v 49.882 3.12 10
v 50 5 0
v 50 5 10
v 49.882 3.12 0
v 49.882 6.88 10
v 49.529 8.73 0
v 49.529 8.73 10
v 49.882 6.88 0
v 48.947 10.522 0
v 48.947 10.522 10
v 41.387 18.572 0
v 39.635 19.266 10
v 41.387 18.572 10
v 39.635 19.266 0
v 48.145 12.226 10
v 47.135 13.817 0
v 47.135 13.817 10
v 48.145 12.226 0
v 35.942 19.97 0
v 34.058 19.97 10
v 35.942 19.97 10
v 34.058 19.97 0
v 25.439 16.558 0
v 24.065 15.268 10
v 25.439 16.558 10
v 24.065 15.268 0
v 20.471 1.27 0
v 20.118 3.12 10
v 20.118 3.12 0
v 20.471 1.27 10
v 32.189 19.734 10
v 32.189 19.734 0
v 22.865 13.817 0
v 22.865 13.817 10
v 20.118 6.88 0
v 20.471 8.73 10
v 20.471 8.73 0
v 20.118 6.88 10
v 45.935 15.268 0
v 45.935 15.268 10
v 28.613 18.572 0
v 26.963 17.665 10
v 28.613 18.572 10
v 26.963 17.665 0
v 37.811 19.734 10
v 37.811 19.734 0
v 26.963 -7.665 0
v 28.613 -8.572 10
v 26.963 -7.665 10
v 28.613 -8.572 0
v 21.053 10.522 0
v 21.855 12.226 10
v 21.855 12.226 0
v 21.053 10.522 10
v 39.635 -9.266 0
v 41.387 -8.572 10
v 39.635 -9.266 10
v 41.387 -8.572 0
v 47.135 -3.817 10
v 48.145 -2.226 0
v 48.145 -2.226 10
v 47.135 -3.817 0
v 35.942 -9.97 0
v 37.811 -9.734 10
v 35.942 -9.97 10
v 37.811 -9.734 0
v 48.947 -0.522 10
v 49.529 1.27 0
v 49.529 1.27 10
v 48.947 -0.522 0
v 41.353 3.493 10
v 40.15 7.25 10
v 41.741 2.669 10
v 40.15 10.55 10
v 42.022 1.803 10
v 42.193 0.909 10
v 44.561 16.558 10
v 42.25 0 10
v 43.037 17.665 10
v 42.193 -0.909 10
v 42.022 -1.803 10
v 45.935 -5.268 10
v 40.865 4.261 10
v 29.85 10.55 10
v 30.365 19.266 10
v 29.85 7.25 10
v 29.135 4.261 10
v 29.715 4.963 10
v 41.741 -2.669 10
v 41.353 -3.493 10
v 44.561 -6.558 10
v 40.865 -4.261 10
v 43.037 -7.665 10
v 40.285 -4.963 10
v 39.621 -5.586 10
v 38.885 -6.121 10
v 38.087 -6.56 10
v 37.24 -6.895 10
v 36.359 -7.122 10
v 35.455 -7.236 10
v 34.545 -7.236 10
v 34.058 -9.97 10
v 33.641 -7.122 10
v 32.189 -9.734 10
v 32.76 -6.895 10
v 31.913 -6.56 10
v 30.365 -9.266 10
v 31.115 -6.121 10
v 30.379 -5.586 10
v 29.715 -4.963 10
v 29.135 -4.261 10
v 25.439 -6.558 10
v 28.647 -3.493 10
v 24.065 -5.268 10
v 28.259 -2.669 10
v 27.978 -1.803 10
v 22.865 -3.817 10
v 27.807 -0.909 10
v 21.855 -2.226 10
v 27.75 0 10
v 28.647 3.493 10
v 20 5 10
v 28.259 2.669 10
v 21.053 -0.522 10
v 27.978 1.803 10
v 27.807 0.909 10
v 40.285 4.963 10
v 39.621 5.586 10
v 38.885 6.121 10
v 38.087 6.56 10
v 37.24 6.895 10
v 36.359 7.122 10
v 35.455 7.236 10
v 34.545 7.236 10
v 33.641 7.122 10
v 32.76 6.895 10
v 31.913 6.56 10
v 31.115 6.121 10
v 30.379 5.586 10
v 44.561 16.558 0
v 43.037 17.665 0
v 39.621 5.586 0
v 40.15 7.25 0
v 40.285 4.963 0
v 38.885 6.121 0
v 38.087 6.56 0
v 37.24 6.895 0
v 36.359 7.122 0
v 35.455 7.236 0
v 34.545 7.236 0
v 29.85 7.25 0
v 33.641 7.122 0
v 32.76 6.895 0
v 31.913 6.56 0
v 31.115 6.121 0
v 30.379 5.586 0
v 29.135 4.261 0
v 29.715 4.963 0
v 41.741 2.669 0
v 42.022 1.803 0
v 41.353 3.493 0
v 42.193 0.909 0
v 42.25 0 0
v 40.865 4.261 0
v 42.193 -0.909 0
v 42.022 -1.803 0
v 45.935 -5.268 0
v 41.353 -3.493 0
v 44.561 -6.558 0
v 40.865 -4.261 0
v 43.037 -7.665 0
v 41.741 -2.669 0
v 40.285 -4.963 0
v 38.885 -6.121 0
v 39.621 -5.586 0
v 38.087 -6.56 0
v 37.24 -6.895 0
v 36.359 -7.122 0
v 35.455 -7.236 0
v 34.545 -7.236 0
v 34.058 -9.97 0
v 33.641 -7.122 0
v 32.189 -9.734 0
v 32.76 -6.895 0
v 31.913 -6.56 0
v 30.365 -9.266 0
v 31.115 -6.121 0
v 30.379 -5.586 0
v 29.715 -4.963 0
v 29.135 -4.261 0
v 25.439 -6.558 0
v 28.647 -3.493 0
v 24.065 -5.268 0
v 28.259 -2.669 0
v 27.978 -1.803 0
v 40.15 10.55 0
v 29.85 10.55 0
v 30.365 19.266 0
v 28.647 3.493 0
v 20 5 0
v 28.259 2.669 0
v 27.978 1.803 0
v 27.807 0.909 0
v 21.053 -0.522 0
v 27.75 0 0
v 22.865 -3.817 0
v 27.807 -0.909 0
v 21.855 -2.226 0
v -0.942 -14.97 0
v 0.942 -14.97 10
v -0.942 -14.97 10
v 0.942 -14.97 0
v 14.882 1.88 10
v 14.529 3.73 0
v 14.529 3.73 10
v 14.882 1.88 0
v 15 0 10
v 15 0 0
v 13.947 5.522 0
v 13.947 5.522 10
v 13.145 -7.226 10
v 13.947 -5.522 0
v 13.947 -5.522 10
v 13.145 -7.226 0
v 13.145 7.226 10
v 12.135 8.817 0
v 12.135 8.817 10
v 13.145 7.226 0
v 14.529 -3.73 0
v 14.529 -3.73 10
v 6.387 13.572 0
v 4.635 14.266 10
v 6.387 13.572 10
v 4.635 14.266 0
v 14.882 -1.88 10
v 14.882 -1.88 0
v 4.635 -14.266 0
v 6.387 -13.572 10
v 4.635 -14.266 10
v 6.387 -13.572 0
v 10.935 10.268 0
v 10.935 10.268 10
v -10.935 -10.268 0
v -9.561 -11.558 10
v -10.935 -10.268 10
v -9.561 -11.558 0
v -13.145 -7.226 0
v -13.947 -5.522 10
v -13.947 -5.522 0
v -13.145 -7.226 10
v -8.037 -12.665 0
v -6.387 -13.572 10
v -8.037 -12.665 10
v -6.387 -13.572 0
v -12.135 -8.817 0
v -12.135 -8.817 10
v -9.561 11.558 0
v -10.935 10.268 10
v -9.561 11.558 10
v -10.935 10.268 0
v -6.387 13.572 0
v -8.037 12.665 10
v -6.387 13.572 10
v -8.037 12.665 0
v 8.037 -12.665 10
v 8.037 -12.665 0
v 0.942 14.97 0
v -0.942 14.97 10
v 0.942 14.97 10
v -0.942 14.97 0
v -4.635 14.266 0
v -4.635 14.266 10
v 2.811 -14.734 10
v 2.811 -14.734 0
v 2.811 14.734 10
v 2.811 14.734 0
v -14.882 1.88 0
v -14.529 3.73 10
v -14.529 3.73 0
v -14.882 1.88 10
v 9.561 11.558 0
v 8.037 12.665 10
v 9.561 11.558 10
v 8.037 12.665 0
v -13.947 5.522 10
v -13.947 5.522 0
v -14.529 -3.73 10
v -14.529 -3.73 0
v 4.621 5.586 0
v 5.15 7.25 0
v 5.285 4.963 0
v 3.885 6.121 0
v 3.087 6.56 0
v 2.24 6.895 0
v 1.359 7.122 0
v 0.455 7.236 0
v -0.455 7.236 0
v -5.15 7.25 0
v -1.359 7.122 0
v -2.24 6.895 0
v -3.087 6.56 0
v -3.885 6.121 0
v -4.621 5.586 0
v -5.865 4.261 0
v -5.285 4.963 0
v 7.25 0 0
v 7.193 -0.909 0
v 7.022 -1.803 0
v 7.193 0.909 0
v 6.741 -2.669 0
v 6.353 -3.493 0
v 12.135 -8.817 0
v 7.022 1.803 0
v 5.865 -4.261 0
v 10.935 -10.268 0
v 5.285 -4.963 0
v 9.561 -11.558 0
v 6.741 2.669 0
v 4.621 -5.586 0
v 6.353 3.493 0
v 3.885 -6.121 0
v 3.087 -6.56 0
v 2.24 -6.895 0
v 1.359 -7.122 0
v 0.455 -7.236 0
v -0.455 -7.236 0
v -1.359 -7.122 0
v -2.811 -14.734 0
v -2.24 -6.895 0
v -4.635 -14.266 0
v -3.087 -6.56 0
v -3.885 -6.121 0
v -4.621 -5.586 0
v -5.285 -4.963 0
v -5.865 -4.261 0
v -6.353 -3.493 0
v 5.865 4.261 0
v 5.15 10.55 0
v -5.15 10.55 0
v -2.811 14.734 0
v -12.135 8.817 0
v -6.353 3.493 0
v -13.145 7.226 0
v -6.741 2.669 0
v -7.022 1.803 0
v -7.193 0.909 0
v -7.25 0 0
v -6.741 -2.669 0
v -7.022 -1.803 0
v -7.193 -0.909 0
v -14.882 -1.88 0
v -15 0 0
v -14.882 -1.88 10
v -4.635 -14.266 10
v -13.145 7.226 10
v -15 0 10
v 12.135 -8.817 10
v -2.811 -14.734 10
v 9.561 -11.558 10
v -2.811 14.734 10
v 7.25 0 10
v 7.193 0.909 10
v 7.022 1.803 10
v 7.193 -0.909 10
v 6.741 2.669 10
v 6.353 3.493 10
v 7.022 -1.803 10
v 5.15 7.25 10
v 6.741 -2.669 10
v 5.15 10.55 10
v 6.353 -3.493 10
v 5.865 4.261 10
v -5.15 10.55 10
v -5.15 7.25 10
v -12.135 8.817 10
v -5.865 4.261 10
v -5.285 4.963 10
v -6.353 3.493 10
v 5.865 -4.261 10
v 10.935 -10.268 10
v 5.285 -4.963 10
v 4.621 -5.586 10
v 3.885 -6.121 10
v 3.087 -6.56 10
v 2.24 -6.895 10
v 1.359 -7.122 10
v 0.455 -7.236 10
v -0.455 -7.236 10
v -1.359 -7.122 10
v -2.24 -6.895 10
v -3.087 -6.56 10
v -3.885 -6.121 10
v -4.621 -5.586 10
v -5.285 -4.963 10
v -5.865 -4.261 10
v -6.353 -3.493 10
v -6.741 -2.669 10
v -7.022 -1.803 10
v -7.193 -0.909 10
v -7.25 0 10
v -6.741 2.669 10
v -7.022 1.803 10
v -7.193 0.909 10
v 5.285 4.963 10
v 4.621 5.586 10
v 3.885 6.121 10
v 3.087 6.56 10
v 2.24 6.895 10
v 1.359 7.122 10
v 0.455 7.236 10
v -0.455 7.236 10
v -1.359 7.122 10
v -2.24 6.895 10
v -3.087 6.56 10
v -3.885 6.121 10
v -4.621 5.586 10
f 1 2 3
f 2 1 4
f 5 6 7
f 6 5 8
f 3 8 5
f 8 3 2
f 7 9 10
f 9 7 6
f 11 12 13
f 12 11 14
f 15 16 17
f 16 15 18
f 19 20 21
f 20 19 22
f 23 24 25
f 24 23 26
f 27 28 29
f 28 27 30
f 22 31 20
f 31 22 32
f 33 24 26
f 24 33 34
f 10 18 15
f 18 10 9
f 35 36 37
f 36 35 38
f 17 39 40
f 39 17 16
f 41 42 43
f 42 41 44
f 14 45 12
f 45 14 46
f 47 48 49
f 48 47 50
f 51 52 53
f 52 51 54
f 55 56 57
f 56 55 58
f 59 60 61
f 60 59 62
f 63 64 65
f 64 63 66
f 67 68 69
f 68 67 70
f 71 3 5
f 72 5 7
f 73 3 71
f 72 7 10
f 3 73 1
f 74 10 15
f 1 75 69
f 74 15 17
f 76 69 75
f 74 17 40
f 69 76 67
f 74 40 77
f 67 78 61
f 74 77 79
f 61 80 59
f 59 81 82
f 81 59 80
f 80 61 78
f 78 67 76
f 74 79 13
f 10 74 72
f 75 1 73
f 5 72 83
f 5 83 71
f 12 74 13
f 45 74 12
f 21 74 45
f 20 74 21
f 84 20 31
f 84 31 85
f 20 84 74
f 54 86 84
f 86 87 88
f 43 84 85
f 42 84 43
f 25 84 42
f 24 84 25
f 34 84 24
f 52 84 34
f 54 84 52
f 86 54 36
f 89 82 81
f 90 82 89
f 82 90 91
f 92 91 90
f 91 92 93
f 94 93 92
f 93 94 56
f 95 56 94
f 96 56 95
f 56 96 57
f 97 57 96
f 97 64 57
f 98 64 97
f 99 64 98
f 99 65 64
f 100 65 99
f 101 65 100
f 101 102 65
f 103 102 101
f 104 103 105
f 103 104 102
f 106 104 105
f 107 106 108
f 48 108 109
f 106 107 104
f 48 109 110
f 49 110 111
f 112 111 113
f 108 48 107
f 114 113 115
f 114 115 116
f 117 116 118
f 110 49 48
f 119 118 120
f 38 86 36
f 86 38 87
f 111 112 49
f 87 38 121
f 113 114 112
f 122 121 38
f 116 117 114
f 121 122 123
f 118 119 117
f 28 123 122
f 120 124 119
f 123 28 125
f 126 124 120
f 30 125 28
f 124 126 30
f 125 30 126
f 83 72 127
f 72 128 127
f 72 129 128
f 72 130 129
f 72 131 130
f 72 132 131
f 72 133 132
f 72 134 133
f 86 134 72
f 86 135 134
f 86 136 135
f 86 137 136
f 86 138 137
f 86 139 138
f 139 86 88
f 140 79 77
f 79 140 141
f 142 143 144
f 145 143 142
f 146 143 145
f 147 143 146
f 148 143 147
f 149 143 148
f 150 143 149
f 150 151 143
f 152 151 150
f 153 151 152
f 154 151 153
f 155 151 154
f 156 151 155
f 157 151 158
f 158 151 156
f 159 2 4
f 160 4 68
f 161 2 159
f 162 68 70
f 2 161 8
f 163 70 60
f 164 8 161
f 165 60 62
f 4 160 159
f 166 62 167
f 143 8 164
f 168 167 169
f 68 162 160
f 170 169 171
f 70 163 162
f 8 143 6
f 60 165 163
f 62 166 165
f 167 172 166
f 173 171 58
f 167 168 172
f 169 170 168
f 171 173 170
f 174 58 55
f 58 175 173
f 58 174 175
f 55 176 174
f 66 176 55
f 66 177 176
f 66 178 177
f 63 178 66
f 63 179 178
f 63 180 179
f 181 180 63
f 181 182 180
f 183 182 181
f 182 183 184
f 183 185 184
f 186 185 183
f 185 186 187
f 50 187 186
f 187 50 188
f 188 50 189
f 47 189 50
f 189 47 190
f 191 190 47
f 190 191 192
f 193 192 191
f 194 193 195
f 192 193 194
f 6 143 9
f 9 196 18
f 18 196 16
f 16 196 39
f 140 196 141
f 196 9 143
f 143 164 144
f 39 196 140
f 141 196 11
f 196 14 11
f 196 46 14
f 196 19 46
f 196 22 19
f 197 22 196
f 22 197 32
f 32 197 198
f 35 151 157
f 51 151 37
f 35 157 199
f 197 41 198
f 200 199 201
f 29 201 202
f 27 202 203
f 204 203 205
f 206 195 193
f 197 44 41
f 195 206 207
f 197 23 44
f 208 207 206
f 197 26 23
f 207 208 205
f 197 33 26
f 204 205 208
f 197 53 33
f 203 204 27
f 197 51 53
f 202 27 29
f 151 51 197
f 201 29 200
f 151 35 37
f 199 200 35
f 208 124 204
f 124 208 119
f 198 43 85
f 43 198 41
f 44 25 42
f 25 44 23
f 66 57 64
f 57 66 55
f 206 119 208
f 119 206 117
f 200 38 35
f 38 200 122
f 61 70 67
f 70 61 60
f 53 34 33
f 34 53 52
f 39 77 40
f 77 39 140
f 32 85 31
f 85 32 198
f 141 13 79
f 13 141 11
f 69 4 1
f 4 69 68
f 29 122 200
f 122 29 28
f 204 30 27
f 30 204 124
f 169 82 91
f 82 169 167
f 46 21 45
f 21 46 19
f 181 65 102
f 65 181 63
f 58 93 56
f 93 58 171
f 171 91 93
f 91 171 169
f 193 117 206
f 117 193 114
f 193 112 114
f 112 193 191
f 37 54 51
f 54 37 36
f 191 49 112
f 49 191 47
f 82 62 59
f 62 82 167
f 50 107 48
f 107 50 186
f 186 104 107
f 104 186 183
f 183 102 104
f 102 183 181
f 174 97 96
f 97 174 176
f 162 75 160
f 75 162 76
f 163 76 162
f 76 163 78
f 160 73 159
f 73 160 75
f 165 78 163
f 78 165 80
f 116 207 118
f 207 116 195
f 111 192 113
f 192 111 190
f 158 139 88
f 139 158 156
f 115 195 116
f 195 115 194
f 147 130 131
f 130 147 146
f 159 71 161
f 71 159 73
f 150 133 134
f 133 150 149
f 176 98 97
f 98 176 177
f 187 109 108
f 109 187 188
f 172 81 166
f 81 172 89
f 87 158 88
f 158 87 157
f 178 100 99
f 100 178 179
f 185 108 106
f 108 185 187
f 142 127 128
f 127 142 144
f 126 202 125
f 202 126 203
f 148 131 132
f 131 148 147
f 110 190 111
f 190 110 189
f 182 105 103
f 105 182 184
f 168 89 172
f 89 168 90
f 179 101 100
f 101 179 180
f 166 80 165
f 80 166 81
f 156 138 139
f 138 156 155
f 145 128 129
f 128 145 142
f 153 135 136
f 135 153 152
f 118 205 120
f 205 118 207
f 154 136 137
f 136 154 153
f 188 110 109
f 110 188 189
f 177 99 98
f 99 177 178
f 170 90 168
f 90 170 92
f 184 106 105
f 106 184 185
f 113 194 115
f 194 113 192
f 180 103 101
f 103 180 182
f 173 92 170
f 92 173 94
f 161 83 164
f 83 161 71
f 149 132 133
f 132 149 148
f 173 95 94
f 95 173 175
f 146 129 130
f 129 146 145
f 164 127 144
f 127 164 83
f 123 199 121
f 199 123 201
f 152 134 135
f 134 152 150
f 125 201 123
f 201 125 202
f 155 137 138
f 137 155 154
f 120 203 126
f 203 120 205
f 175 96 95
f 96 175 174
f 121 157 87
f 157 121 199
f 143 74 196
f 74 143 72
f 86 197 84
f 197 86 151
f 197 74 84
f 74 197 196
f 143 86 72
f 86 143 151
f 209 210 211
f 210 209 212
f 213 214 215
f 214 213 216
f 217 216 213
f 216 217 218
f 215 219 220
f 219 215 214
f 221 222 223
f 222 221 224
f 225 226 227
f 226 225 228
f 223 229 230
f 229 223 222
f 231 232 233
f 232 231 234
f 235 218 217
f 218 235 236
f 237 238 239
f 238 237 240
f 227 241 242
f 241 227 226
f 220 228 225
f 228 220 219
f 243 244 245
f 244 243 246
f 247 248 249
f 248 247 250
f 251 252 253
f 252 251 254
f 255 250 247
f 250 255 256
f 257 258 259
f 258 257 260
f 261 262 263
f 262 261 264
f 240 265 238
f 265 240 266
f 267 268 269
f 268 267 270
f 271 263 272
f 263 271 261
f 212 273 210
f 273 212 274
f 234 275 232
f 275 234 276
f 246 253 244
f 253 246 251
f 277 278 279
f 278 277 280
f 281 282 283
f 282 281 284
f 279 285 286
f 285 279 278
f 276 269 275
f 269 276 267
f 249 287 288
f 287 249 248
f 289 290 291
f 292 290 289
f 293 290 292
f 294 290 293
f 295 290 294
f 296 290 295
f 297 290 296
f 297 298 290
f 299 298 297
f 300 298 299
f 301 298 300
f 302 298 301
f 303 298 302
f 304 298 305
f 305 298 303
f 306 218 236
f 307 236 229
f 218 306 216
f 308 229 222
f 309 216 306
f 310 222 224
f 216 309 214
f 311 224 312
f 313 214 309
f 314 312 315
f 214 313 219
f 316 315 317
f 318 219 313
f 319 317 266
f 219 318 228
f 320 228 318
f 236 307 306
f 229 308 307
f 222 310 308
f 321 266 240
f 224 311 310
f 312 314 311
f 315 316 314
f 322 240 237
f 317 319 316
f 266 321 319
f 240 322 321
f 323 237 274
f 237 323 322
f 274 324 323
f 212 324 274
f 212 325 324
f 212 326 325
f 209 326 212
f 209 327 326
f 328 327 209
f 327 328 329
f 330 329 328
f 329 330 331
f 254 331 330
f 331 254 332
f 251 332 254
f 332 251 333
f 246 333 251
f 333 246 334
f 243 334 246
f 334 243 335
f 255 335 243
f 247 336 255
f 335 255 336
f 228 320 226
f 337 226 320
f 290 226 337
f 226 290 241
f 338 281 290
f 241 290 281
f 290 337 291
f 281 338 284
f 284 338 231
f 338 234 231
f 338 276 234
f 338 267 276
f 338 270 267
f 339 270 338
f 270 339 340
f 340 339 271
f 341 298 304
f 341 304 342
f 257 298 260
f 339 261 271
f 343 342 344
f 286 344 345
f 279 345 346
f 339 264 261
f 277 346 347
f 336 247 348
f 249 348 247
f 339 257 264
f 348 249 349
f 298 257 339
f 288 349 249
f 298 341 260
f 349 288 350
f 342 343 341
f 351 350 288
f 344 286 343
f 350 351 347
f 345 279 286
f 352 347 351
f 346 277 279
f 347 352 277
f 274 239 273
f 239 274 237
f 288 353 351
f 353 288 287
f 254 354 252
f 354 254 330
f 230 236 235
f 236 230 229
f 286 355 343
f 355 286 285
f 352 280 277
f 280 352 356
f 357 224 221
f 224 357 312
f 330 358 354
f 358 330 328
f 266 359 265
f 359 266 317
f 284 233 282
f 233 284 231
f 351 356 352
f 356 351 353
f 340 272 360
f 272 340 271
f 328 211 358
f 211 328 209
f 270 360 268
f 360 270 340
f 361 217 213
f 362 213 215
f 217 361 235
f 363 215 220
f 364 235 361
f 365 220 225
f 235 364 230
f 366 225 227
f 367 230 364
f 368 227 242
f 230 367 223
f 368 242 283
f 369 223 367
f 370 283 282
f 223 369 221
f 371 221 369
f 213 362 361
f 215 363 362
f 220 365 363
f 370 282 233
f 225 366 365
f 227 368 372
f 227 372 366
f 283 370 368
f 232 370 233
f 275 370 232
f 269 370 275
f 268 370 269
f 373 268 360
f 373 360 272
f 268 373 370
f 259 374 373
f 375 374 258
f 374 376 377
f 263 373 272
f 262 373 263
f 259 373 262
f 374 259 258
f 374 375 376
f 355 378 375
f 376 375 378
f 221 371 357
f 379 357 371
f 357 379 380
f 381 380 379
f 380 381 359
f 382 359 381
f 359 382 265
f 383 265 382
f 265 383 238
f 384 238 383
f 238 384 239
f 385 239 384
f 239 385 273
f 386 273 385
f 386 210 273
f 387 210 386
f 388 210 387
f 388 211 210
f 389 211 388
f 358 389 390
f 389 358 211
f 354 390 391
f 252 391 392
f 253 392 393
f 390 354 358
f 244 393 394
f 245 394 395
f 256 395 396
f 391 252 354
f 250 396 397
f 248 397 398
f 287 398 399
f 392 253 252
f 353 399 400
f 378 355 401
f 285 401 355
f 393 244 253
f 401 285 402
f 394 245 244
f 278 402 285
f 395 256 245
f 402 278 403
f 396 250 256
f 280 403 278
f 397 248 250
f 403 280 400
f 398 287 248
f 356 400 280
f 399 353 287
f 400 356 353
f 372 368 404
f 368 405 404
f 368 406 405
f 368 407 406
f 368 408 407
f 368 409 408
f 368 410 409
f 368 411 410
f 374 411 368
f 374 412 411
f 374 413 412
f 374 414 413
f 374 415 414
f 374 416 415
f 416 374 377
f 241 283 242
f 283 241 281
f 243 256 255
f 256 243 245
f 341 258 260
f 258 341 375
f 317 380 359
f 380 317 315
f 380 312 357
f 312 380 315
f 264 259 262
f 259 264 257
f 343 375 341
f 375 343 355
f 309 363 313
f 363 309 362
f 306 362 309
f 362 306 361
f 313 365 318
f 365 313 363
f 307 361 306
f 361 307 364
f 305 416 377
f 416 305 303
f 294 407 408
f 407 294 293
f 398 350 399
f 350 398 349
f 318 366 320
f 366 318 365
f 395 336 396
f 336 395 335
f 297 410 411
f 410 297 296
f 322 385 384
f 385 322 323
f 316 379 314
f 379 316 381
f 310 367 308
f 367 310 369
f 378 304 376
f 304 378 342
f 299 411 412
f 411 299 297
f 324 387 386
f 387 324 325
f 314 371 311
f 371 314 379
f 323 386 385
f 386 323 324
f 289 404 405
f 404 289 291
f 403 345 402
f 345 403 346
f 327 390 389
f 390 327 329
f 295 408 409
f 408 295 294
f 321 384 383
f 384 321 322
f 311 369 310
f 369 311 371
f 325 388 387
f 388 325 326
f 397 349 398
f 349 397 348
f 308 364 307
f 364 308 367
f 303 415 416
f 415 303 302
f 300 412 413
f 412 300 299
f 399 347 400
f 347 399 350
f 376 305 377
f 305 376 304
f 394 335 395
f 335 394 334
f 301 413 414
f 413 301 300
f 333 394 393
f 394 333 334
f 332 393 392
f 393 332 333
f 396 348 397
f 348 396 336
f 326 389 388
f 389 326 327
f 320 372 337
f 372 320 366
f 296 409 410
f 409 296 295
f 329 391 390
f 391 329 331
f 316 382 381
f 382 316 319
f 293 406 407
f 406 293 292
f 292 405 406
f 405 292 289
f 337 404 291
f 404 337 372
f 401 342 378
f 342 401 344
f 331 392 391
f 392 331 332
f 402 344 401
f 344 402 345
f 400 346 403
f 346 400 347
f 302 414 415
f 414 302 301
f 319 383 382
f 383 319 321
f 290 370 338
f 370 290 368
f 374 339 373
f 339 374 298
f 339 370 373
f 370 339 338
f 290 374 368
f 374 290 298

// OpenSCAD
$fn = 50;

module centre_roller(roller_diam, shaft_diam, key_x, key_y, axis_off, height) {
    difference() {
        // The actual roller
        translate([0, axis_off, 0]) cylinder(d=roller_diam, h=height);
        // The centre bearing
        translate([0, 0, -0.01]) cylinder(d=shaft_diam, h=height+0.02);
        // The key
        translate([-key_x/2, shaft_diam/2, -0.01]) cube([key_x, key_y, height+0.02]);
    }
}

module end_block(roller_diam, shaft_diam, height) { difference() {
    cube([end_block_length, end_block_width, 10]);
    translate([0, end_block_width/2, -0.01]) union() {
        translate([
            (end_block_length-roller_diam-separation)/2, 0, 0
        ]) cylinder(d=shaft_diam, h=height+0.02);
        translate([
            (end_block_length+roller_diam+separation)/2, 0, 0
        ]) cylinder(d=shaft_diam, h=height+0.02);
    }
}}

roller_diam = 30;
shaft_diam = 14.5;
key_x = 10.3;
key_y = 3.3;
axis_off = 5;
height = 10;

// bearing diameter = corner point of key
x = key_x/2;
y = key_y+(shaft_diam/2);
bearing_diam = sqrt(x*x + y*y)*2 + 1;
//bearing_diam = 25;

end_block_length = 100;
end_block_width = 60;
separation = 3;

// translate([(end_block_length-roller_diam-separation)/2, end_block_width/2, 0])
translate([(roller_diam+5)*1, 0, 0]) 
  centre_roller(roller_diam, shaft_diam, key_x, key_y, axis_off, height);
// translate([(end_block_length+roller_diam+separation)/2, end_block_width/2, 0])
translate([(roller_diam+5)*0, 0, 0]) 
  centre_roller(roller_diam, shaft_diam, key_x, key_y, 0, height);
// translate([(end_block_length+roller_diam+separation)/2, end_block_width/2, height])
*   centre_roller(bearing_diam, shaft_diam, key_x, key_y, 0, height);

* translate([-bearing_diam/2, (roller_diam/2+10)*1, 0])
  end_block(roller_diam, bearing_diam, height);
